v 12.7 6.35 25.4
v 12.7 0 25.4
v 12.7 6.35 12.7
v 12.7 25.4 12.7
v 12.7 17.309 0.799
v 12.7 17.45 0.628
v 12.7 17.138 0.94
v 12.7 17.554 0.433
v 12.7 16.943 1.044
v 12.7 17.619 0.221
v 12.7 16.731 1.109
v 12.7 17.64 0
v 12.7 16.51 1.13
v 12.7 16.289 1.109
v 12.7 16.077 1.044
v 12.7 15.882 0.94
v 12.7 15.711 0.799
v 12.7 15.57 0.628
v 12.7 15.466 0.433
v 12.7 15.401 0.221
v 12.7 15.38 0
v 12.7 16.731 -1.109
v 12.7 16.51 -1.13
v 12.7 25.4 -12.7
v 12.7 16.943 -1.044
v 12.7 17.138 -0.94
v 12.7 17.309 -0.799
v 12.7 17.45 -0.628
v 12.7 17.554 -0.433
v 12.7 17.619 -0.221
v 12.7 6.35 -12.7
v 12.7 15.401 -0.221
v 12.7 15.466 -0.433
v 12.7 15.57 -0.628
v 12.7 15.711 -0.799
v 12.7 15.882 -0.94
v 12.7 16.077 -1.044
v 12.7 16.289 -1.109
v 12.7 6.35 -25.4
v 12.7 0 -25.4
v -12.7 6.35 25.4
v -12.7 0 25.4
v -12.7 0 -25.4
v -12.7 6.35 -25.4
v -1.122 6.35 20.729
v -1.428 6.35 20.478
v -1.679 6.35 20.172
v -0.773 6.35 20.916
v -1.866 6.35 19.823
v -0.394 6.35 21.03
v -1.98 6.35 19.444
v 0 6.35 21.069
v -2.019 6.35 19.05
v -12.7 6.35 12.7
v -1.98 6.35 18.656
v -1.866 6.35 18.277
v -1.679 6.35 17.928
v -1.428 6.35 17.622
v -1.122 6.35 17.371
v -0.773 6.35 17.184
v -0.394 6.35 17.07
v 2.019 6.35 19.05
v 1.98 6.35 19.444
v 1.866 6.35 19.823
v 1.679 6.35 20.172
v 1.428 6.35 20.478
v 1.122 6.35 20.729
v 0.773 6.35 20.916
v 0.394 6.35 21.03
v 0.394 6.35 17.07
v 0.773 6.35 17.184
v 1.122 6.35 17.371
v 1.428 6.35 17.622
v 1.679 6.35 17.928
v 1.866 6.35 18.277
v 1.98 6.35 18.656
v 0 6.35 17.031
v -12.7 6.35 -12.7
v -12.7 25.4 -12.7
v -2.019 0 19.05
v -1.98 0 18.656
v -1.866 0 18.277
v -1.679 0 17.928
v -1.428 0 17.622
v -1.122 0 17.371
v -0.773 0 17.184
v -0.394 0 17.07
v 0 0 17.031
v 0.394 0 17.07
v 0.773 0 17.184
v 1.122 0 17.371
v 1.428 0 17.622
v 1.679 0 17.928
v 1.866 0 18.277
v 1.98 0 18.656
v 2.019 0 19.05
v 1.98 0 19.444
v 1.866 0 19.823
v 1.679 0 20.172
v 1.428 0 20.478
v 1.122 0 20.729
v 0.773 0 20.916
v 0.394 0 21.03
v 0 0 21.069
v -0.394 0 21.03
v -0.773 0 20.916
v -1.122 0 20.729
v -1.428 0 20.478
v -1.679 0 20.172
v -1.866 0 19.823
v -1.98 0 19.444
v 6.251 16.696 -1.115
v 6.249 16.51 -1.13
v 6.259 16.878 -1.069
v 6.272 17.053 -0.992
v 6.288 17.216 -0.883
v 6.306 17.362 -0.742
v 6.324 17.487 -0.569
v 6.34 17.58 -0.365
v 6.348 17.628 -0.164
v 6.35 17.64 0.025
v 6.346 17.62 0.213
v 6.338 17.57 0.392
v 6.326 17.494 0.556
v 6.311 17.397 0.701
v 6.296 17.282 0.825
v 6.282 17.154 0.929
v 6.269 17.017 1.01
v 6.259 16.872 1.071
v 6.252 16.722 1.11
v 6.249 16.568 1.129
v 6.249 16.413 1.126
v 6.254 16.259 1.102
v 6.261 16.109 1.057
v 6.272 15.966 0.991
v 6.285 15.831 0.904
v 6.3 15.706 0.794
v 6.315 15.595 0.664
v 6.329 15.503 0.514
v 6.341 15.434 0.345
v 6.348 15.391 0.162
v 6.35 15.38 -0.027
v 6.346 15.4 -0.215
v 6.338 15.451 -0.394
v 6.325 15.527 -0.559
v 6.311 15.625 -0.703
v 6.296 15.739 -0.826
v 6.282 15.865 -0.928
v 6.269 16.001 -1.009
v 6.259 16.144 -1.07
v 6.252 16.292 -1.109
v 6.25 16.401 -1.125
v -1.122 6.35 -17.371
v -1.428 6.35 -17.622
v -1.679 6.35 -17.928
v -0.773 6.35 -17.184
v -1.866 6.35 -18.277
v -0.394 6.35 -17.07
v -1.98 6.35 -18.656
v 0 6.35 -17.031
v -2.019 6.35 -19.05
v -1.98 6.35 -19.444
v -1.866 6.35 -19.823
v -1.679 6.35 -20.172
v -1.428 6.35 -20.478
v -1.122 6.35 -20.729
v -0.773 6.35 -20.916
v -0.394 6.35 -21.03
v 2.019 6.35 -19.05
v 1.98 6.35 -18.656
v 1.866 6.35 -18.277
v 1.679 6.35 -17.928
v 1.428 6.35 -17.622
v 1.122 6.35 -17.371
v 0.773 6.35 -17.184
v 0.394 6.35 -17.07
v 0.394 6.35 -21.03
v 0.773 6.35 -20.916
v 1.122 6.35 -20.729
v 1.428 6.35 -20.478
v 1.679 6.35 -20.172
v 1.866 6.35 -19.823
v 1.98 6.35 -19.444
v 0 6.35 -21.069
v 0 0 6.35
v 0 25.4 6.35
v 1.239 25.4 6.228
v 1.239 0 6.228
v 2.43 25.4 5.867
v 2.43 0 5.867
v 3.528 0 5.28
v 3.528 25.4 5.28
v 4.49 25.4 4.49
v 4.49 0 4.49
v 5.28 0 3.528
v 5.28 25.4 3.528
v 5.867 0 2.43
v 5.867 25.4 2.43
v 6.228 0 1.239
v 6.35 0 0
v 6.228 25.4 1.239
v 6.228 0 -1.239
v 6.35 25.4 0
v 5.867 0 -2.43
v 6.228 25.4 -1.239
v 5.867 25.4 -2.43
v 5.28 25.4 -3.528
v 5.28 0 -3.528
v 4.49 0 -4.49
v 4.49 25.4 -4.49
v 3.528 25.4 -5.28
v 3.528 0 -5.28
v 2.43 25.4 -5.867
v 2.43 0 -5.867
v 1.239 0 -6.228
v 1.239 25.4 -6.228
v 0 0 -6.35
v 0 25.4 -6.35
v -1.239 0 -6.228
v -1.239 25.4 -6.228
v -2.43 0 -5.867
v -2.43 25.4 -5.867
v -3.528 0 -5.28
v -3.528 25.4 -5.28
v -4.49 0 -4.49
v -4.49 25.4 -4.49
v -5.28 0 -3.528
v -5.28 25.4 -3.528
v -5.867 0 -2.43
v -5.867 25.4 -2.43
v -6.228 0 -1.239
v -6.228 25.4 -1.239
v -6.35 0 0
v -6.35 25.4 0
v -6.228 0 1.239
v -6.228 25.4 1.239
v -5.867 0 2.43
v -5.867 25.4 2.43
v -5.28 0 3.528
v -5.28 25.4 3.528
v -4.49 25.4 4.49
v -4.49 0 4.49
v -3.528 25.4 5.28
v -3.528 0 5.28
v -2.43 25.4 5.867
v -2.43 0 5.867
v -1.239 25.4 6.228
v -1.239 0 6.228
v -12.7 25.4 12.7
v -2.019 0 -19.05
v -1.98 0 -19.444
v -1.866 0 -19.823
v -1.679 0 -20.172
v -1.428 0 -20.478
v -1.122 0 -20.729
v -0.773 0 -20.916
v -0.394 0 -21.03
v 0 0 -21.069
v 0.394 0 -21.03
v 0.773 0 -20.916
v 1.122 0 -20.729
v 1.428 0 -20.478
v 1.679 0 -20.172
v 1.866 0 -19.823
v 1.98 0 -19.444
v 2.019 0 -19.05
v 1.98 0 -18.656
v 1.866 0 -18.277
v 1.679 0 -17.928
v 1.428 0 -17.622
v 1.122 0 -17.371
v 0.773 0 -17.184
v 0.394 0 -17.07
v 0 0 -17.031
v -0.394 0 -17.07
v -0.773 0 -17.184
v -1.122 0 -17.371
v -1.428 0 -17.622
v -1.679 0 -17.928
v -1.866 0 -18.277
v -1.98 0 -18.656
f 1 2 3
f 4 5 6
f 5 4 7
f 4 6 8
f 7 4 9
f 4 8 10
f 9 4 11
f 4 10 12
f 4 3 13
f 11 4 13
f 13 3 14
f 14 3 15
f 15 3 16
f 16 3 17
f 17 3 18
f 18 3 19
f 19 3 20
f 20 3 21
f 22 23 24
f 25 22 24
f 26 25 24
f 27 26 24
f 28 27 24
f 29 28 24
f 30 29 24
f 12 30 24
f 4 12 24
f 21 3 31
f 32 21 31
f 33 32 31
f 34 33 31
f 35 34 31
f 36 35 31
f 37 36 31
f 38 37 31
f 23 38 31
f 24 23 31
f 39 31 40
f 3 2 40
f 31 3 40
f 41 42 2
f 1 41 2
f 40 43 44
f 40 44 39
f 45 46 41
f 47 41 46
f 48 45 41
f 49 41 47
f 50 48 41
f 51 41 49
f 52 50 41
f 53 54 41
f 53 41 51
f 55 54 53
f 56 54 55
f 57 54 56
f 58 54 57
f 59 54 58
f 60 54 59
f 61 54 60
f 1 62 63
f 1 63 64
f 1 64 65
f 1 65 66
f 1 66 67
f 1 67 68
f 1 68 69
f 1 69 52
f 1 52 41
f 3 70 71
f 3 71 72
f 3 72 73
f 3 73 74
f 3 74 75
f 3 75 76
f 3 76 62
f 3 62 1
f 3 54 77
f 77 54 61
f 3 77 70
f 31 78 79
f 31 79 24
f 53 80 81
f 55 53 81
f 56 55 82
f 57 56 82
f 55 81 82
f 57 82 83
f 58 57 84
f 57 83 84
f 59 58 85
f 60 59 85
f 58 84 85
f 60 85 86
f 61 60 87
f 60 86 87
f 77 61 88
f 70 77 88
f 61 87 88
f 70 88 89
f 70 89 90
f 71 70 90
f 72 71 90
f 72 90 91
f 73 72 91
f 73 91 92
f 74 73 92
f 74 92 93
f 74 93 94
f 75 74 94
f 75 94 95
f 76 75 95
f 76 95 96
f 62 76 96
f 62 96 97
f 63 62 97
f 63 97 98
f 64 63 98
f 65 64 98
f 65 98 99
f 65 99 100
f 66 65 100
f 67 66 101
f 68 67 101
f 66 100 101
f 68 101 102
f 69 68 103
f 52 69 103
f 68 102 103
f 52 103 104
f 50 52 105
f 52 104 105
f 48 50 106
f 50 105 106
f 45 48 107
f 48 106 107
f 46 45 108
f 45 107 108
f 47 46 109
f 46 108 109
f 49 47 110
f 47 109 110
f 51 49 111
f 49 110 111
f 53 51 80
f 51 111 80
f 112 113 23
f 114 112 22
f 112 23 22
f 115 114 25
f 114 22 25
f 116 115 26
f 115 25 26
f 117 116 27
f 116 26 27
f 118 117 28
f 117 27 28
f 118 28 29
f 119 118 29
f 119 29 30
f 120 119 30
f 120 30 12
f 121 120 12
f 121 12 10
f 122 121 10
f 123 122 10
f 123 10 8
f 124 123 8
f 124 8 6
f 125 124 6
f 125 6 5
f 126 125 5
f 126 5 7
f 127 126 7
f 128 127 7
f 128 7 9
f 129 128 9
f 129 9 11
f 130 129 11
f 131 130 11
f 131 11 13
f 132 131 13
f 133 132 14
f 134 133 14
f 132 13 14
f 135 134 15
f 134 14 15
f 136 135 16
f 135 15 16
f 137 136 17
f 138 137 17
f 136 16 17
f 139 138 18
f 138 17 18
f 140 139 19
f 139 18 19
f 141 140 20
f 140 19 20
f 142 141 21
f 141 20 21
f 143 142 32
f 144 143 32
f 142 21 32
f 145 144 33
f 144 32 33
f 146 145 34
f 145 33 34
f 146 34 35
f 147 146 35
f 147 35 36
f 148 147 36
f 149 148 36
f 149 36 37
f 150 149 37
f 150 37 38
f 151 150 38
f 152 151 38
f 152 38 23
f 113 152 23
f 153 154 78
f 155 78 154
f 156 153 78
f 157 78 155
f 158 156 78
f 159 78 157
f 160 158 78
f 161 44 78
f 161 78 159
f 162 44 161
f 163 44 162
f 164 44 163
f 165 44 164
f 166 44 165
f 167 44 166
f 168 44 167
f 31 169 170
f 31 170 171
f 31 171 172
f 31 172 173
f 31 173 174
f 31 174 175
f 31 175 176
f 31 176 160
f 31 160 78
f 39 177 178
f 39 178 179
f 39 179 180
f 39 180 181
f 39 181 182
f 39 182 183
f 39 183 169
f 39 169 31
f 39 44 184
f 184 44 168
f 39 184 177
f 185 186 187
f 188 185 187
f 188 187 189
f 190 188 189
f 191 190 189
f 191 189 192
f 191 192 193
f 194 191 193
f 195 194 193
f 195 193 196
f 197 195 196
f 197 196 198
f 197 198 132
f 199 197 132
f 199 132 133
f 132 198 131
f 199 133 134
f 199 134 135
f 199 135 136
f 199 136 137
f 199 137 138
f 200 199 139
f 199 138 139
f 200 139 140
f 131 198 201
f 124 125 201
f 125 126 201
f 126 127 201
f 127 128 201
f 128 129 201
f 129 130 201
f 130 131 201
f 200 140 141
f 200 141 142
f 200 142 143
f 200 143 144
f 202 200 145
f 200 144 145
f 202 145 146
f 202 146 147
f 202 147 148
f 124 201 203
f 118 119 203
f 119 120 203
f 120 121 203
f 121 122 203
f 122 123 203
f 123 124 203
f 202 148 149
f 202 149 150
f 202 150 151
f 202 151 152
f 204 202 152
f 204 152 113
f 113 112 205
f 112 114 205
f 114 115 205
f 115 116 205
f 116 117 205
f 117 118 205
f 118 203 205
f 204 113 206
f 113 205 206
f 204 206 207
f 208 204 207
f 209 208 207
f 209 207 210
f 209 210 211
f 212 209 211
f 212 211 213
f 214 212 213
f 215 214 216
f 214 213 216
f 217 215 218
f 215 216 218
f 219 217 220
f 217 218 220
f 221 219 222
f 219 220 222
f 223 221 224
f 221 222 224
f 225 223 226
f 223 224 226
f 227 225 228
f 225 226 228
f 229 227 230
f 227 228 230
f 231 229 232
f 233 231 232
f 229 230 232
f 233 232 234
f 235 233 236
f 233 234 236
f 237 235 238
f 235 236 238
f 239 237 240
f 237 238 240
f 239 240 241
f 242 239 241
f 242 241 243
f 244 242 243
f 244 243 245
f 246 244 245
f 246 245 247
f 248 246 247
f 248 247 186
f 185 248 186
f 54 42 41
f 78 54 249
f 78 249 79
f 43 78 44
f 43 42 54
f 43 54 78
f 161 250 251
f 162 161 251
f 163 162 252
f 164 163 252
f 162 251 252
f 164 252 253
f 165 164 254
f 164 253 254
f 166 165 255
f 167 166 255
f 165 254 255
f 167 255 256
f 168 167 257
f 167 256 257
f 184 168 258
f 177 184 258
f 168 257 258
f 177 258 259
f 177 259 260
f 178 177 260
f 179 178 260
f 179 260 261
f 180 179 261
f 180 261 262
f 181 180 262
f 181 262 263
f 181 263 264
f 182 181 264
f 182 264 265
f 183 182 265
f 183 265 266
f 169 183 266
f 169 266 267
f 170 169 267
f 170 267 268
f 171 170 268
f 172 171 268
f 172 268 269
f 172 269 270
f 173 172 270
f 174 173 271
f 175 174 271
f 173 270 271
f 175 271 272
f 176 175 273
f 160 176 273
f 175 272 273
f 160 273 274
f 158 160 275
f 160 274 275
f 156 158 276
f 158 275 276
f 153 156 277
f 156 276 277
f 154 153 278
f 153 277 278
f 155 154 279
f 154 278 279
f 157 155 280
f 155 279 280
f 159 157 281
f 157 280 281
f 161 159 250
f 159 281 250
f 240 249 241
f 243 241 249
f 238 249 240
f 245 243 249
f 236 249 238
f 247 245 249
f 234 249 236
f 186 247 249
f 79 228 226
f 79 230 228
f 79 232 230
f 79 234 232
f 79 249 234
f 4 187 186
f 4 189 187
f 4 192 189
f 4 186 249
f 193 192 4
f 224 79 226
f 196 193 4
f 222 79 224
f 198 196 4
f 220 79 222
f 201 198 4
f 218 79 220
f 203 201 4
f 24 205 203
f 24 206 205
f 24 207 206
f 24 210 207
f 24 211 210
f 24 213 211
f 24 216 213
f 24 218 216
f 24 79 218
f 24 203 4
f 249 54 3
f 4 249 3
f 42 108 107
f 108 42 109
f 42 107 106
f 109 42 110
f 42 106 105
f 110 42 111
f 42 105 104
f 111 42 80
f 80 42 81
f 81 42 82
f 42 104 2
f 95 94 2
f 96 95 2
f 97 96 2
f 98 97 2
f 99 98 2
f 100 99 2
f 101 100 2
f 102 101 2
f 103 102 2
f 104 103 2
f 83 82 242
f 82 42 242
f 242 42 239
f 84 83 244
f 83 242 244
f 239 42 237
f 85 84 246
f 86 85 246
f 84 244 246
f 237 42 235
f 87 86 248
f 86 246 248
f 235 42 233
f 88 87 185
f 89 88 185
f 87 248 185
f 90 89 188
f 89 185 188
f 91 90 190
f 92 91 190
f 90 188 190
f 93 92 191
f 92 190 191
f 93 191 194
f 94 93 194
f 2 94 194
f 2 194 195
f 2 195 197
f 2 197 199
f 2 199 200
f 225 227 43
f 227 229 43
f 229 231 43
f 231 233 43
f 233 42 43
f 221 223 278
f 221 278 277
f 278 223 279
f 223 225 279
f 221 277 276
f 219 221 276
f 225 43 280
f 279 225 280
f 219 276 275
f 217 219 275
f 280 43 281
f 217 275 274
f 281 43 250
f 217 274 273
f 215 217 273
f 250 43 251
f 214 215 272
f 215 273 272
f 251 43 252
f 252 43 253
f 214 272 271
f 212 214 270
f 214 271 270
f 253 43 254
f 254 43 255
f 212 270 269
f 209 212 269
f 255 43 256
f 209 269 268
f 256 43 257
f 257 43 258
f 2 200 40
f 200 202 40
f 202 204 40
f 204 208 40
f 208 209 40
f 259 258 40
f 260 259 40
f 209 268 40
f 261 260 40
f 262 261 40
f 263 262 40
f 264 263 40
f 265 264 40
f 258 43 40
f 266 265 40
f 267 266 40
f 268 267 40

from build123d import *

# Parameters (mm, degrees)
SKETCH1_W                  = 25.4
SKETCH1_H                  = 50.8
BOSS_EXTRUDE1_DEPTH        = 6.35
SKETCH2_W                  = 25.4
SKETCH2_H                  = 25.4
BOSS_EXTRUDE2_DEPTH        = 19.05
SKETCH3_R                  = 6.35
CUT_EXTRUDE1_DEPTH         = 39.1
F_10_32_TAPPED_HOLE1_D     = 4.0386
F_4_40_TAPPED_HOLE1_REACH  = 45.994
F_4_40_TAPPED_HOLE1_BORE_R = 1.1303


with BuildPart() as part:
    # Sketch1 → Boss-Extrude1 (new body)
    with BuildSketch(Plane(origin=(0, 0, 0), x_dir=(1, 0, 0), z_dir=(0, 1, 0))):
        Rectangle(SKETCH1_W, SKETCH1_H)
    extrude(amount=BOSS_EXTRUDE1_DEPTH)

    # Sketch2 → Boss-Extrude2 (add)
    with BuildSketch(Plane(origin=(0, 6.35, 0), x_dir=(1, 0, 0), z_dir=(0, 1, 0))):
        Rectangle(SKETCH2_W, SKETCH2_H)
    extrude(amount=BOSS_EXTRUDE2_DEPTH)

    # Sketch3 → Cut-Extrude1 (cut, through all)
    with BuildSketch(Plane(origin=(0, 25.4, 0), x_dir=(1, 0, 0), z_dir=(0, 1, 0))):
        with Locations(Location((0, 0, 0), (0, 0, 270))):
            Circle(SKETCH3_R)
    extrude(amount=-CUT_EXTRUDE1_DEPTH, mode=Mode.SUBTRACT)

    # #10-32 Tapped Hole1 (through all)
    with Locations(Plane(origin=(0, 6.35, 0), x_dir=(1, 0, 0), z_dir=(0, 1, 0))):
        with Locations((0, 19.05), (0, -19.05)):
            Hole(F_10_32_TAPPED_HOLE1_D / 2)

    # #4-40 Tapped Hole1 bore → #4-40 Tapped Hole1 (cut, up to next)
    with BuildSketch(Plane(origin=(12.7, 0, 0), x_dir=(0, 0, -1), z_dir=(1, 0, 0)), mode=Mode.PRIVATE) as f_4_40_tapped_hole1_sk1:
        with Locations((0, 16.51)):
            Circle(F_4_40_TAPPED_HOLE1_BORE_R)
    f_4_40_tapped_hole1_tool1 = extrude(f_4_40_tapped_hole1_sk1.sketch, amount=-F_4_40_TAPPED_HOLE1_REACH, mode=Mode.PRIVATE) & part.part
    add(f_4_40_tapped_hole1_tool1.solids().sort_by_distance((12.7, 16.51, 0))[0], mode=Mode.SUBTRACT)


solid = part.part
